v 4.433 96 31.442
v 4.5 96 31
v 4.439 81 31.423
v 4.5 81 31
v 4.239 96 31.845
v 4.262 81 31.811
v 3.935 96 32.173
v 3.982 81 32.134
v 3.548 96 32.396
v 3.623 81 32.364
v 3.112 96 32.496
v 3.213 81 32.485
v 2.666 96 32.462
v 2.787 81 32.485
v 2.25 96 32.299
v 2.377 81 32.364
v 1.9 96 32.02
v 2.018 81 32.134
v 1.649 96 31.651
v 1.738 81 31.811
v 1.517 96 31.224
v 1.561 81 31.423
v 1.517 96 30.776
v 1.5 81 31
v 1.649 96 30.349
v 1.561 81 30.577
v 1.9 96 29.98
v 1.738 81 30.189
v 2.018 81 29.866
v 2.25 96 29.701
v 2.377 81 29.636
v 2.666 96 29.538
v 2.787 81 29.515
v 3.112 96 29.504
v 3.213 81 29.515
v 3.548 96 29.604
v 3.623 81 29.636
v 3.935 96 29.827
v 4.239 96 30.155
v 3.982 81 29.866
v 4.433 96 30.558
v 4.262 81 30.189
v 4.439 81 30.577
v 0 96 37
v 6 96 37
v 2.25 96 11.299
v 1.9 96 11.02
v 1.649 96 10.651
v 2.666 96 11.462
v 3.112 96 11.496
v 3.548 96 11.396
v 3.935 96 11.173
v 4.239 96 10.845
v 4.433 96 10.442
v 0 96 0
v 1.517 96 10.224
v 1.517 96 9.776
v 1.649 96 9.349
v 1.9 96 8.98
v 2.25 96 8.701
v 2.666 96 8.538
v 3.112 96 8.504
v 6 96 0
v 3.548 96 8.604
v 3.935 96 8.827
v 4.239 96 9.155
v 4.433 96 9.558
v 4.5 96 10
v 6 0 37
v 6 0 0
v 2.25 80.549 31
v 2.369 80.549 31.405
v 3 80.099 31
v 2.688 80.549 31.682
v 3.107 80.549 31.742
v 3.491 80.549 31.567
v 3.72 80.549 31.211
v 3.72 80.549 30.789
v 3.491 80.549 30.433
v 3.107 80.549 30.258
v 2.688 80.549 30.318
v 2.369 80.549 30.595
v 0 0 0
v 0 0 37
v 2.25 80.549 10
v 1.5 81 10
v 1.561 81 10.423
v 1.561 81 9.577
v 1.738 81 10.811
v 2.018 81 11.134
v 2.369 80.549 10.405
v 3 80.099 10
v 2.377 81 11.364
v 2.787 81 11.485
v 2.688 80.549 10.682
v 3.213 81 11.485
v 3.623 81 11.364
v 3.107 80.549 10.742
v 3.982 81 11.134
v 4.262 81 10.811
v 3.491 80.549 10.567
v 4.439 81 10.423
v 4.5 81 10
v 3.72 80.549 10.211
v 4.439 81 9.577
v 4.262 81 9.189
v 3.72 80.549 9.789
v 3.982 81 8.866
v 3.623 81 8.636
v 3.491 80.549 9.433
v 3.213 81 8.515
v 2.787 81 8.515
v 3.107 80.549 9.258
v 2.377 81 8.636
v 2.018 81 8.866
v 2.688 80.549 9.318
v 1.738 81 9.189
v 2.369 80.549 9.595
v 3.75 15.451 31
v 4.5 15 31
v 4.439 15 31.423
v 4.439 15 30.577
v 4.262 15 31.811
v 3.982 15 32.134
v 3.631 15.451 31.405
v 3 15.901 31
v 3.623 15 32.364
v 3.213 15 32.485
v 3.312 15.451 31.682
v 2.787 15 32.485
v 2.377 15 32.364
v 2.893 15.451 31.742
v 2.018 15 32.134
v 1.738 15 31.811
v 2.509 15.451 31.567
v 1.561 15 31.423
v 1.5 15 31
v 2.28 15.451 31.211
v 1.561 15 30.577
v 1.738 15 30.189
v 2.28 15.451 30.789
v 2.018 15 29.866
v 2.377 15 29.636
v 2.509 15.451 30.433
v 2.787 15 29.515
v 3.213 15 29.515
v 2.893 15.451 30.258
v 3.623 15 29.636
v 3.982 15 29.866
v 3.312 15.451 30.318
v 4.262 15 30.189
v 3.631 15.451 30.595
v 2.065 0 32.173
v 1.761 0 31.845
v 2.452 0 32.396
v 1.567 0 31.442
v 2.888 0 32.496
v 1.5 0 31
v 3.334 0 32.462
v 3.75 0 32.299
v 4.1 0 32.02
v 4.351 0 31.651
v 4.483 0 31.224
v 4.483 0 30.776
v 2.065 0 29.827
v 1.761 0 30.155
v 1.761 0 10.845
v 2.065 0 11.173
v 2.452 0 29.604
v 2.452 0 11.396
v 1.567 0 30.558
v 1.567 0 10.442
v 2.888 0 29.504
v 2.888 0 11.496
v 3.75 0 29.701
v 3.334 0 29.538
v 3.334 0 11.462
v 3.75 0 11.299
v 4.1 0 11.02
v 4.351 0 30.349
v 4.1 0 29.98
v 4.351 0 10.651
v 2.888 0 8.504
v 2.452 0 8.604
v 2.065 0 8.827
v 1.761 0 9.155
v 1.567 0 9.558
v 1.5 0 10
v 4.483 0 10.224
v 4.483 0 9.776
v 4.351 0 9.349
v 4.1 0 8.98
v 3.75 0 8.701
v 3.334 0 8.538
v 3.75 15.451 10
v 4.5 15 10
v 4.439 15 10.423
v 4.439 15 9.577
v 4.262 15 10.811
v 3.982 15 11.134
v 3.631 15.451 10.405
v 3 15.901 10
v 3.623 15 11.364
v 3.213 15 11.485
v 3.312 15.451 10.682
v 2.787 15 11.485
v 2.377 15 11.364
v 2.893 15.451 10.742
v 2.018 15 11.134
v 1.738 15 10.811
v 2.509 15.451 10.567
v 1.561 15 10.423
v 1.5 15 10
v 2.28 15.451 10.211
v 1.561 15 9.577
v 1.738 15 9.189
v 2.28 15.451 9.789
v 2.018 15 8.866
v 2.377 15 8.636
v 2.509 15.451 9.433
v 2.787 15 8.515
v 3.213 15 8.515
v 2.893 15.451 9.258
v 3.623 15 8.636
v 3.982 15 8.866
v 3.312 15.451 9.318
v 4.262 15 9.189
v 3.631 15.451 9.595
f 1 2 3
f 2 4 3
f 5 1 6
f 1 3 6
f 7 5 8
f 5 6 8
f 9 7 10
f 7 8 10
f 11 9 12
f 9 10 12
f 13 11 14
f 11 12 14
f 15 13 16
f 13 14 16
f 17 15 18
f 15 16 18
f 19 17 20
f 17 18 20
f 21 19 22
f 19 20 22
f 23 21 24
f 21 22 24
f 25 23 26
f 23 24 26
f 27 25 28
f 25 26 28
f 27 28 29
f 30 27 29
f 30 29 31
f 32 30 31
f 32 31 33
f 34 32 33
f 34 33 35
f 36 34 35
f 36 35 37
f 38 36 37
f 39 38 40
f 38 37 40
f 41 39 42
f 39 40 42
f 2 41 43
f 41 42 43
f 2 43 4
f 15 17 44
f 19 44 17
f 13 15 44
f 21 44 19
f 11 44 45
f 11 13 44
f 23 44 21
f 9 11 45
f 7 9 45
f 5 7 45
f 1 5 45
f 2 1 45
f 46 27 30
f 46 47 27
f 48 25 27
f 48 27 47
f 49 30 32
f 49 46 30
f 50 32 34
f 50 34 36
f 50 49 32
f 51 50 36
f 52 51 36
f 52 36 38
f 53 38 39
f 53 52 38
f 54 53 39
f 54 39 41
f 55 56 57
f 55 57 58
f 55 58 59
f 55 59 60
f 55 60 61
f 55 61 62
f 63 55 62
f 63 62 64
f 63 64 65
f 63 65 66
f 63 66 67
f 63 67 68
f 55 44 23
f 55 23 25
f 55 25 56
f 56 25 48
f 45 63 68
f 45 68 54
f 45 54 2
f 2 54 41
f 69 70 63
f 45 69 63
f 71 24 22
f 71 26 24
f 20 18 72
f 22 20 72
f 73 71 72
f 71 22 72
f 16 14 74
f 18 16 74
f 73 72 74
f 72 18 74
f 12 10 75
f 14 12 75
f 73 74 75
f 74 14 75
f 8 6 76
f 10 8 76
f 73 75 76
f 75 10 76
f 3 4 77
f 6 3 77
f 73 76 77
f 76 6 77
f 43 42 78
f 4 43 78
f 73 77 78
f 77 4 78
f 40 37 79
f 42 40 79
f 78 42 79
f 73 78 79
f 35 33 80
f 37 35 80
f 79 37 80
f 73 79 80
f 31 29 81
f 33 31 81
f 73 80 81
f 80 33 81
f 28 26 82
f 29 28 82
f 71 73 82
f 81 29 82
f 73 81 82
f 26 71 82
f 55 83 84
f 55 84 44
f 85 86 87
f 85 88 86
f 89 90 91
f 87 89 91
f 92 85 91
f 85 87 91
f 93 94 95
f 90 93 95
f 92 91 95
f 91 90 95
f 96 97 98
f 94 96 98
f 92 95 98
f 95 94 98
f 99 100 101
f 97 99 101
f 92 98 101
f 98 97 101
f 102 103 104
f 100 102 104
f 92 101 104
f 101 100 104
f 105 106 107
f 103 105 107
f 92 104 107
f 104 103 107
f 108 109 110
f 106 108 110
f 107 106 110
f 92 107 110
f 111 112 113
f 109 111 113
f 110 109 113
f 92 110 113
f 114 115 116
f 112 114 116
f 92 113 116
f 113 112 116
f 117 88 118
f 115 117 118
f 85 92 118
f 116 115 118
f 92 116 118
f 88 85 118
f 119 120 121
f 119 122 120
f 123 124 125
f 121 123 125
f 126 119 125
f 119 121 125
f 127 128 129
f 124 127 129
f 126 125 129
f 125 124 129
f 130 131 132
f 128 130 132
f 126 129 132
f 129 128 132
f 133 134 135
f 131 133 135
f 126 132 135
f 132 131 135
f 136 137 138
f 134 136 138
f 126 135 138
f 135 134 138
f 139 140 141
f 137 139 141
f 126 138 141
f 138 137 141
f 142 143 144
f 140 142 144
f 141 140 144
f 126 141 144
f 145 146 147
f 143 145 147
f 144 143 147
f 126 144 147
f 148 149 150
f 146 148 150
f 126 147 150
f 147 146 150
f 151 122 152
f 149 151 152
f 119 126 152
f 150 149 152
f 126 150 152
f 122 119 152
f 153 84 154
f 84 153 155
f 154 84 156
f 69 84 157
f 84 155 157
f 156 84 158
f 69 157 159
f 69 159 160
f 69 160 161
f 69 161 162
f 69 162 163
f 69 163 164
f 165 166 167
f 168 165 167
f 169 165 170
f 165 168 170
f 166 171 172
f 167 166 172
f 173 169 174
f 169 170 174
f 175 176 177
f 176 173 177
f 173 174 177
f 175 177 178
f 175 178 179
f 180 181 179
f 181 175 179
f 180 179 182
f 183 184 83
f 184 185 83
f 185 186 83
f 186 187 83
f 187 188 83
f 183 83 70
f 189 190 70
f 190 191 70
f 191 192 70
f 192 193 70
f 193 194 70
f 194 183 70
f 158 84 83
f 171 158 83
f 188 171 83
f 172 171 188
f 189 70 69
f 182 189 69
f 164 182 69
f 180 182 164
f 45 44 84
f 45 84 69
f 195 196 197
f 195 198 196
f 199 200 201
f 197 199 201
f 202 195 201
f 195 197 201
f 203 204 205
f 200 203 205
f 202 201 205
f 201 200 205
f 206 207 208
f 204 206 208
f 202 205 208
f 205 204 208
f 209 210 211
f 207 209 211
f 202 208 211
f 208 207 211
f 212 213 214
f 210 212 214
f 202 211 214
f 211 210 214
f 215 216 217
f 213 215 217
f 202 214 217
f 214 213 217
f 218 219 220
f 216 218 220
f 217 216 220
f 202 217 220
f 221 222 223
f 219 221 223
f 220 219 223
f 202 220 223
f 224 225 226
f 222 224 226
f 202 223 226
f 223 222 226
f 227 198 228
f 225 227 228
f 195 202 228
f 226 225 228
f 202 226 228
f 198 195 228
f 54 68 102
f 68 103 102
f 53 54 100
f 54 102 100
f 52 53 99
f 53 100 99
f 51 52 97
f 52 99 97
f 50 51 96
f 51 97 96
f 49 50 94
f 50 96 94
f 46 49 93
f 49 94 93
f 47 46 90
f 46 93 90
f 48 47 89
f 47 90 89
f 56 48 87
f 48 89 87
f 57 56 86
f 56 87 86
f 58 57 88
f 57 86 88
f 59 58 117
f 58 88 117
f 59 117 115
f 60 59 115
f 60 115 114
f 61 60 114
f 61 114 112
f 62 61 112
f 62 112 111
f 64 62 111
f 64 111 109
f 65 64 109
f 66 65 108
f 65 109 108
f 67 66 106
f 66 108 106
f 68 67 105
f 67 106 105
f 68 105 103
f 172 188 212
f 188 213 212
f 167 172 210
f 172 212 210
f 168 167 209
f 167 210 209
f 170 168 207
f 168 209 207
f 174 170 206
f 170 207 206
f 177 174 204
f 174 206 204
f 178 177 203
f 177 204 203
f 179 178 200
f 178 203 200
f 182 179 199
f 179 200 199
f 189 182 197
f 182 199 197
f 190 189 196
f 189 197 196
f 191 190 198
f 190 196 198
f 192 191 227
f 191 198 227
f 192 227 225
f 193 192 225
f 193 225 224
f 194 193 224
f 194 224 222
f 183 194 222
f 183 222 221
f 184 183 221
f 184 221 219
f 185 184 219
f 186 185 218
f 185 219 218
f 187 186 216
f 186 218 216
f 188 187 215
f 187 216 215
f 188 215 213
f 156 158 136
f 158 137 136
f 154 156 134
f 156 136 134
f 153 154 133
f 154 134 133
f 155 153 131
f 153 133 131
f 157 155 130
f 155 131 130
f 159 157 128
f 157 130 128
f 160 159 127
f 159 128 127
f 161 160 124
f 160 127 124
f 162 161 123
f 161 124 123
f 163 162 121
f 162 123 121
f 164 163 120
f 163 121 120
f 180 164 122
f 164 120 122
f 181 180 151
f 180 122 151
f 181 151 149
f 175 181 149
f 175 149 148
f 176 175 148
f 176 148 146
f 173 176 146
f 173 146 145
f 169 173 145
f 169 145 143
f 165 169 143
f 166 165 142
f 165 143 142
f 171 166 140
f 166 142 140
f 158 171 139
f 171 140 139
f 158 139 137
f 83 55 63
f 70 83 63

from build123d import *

# Parameters (mm, degrees)
F0_W     = 6
F0_H     = 96
F1_DEPTH = 37
F7_D     = 3
F7_DEPTH = 15
F7_TIP   = 0.9012909285
F9_D     = 3
F9_DEPTH = 15
F9_TIP   = 0.9012909285


# Not quite as in the source:
# - a feature of the source that left no trace in its solid (it failed there, or was rolled back) is left out


with BuildPart() as f1:
    # F0 (on Top) → F1 (new body)
    with BuildSketch(Plane.XY):
        with Locations((3, 48)):
            Rectangle(F0_W, F0_H)
    extrude(amount=F1_DEPTH)

    # F7
    with Locations(Plane.XZ):
        with Locations((3, 31), (3, 10)):
            Hole(F7_D / 2, depth=F7_DEPTH)
            with Locations((0, 0, -(F7_DEPTH + F7_TIP / 2))):  # 118° drill point
                Cone(0, F7_D / 2, F7_TIP, mode=Mode.SUBTRACT)

    # F9
    with Locations(Plane(origin=(0, 96, 0), x_dir=(-1, 0, 0), z_dir=(0, 1, 0))):
        with Locations((-3, 10), (-3, 31)):
            Hole(F9_D / 2, depth=F9_DEPTH)
            with Locations((0, 0, -(F9_DEPTH + F9_TIP / 2))):  # 118° drill point
                Cone(0, F9_D / 2, F9_TIP, mode=Mode.SUBTRACT)


solid = f1.part
